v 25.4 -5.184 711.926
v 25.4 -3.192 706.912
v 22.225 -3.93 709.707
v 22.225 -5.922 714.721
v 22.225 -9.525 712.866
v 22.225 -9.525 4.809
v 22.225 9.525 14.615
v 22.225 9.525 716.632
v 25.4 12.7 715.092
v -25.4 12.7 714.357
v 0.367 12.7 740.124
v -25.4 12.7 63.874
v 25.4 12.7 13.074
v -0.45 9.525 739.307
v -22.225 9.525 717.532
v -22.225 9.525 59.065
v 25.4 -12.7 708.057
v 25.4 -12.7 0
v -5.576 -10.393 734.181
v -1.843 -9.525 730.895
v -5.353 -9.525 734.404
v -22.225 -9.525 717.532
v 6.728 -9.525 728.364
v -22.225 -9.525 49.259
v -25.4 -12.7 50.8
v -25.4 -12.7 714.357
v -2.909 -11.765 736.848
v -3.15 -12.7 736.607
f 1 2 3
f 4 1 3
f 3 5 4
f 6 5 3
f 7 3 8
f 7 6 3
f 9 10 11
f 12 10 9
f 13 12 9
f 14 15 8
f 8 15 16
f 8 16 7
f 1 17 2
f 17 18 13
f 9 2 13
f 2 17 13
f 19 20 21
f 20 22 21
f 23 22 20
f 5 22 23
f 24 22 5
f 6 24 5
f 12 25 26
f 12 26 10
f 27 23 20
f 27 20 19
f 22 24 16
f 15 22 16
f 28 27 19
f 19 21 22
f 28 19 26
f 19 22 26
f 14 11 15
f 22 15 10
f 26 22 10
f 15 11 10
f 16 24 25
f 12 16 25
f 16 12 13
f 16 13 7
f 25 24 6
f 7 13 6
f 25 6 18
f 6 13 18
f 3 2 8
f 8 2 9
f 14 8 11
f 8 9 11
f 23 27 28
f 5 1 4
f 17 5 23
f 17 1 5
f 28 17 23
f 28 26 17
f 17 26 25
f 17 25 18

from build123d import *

# Parameters (mm, degrees)
SKETCH1_W           = 50.8
SKETCH1_H           = 25.4
SKETCH1_W_2         = 44.45
SKETCH1_H_2         = 19.05
BOSS_EXTRUDE1_DEPTH = 771.9314
CUT_EXTRUDE1_DEPTH  = 773.76672179
CUT_EXTRUDE4_DEPTH  = 754.3292
CUT_EXTRUDE5_DEPTH  = 4.0132
SKETCH9_W           = 50.8
SKETCH9_H           = 21.0312
CUT_EXTRUDE7_DEPTH  = 16.8656
SKETCH10_W          = 77.733567683
SKETCH10_H          = 129.906903396
CUT_EXTRUDE8_DEPTH  = 40.64


with BuildPart() as part:
    # Sketch1 → Boss-Extrude1 (new body)
    with BuildSketch(Plane.XY):
        Rectangle(SKETCH1_W, SKETCH1_H)
        Rectangle(SKETCH1_W_2, SKETCH1_H_2, mode=Mode.SUBTRACT)
    extrude(amount=BOSS_EXTRUDE1_DEPTH)

    # Sketch2 → Cut-Extrude1 (cut, through all)
    with BuildSketch(Plane(origin=(0, 12.7, 0), x_dir=(1, 0, 0), z_dir=(0, 1, 0))):
        Polygon((25.4, 0), (-25.4, -50.8), (-25.4, 0), align=None)
        Polygon((-25.4, -771.9314), (25.4, -721.1314), (25.4, -771.9314), align=None)
    extrude(amount=-CUT_EXTRUDE1_DEPTH, mode=Mode.SUBTRACT)

    # Sketch5 → Cut-Extrude4 (cut)
    with BuildSketch(Plane(origin=(12.7, 0, -12.7), x_dir=(0, 1, 0), z_dir=(-0.7071067811865409, 0, 0.7071067811865541))):
        Polygon((12.7, -17.960512242), (12.7, -27.205356192), (-12.7, -17.960512242), align=None)
        Polygon((12.7, -527.877415309), (-12.7, -518.632571358), (-12.7, -527.877415309), align=None)
    extrude(amount=CUT_EXTRUDE4_DEPTH, mode=Mode.SUBTRACT)

    # Sketch7 → Cut-Extrude5 (cut)
    with BuildSketch(Plane(origin=(326.715708963, -168.170913211, 326.715708963), x_dir=(0.5736482337991444, -0.3364323186524704, -0.7468205934662252), z_dir=(0.6644630243886818, -0.3420201433256654, 0.6644630243886694))):
        Polygon((-595.337621849, -22.133397874), (-492.868446349, 40.706054593), (-475.594227989, 12.537844285), (-578.063403489, -50.301608182), align=None)
    extrude(amount=-CUT_EXTRUDE5_DEPTH, mode=Mode.SUBTRACT)

    # Sketch9 → Cut-Extrude7 (cut, symmetric)
    with BuildSketch(Plane(origin=(0, 0, 0), x_dir=(1, 0, 0), z_dir=(0, 1, 0))):
        with Locations((0, -755.37603578)):
            Rectangle(SKETCH9_W, SKETCH9_H)
    extrude(amount=CUT_EXTRUDE7_DEPTH, both=True, mode=Mode.SUBTRACT)

    # Sketch10 → Cut-Extrude8 (cut)
    with BuildSketch(Plane(origin=(-369.87845504, 0, 369.87845504), x_dir=(-0.7071067811865528, 0, -0.7071067811865422), z_dir=(0.7071067811865422, 0, -0.7071067811865528))):
        with Locations((-488.130578971, 23.675993241)):
            Rectangle(SKETCH10_W, SKETCH10_H)
    extrude(amount=-CUT_EXTRUDE8_DEPTH, mode=Mode.SUBTRACT)


solid = part.part
